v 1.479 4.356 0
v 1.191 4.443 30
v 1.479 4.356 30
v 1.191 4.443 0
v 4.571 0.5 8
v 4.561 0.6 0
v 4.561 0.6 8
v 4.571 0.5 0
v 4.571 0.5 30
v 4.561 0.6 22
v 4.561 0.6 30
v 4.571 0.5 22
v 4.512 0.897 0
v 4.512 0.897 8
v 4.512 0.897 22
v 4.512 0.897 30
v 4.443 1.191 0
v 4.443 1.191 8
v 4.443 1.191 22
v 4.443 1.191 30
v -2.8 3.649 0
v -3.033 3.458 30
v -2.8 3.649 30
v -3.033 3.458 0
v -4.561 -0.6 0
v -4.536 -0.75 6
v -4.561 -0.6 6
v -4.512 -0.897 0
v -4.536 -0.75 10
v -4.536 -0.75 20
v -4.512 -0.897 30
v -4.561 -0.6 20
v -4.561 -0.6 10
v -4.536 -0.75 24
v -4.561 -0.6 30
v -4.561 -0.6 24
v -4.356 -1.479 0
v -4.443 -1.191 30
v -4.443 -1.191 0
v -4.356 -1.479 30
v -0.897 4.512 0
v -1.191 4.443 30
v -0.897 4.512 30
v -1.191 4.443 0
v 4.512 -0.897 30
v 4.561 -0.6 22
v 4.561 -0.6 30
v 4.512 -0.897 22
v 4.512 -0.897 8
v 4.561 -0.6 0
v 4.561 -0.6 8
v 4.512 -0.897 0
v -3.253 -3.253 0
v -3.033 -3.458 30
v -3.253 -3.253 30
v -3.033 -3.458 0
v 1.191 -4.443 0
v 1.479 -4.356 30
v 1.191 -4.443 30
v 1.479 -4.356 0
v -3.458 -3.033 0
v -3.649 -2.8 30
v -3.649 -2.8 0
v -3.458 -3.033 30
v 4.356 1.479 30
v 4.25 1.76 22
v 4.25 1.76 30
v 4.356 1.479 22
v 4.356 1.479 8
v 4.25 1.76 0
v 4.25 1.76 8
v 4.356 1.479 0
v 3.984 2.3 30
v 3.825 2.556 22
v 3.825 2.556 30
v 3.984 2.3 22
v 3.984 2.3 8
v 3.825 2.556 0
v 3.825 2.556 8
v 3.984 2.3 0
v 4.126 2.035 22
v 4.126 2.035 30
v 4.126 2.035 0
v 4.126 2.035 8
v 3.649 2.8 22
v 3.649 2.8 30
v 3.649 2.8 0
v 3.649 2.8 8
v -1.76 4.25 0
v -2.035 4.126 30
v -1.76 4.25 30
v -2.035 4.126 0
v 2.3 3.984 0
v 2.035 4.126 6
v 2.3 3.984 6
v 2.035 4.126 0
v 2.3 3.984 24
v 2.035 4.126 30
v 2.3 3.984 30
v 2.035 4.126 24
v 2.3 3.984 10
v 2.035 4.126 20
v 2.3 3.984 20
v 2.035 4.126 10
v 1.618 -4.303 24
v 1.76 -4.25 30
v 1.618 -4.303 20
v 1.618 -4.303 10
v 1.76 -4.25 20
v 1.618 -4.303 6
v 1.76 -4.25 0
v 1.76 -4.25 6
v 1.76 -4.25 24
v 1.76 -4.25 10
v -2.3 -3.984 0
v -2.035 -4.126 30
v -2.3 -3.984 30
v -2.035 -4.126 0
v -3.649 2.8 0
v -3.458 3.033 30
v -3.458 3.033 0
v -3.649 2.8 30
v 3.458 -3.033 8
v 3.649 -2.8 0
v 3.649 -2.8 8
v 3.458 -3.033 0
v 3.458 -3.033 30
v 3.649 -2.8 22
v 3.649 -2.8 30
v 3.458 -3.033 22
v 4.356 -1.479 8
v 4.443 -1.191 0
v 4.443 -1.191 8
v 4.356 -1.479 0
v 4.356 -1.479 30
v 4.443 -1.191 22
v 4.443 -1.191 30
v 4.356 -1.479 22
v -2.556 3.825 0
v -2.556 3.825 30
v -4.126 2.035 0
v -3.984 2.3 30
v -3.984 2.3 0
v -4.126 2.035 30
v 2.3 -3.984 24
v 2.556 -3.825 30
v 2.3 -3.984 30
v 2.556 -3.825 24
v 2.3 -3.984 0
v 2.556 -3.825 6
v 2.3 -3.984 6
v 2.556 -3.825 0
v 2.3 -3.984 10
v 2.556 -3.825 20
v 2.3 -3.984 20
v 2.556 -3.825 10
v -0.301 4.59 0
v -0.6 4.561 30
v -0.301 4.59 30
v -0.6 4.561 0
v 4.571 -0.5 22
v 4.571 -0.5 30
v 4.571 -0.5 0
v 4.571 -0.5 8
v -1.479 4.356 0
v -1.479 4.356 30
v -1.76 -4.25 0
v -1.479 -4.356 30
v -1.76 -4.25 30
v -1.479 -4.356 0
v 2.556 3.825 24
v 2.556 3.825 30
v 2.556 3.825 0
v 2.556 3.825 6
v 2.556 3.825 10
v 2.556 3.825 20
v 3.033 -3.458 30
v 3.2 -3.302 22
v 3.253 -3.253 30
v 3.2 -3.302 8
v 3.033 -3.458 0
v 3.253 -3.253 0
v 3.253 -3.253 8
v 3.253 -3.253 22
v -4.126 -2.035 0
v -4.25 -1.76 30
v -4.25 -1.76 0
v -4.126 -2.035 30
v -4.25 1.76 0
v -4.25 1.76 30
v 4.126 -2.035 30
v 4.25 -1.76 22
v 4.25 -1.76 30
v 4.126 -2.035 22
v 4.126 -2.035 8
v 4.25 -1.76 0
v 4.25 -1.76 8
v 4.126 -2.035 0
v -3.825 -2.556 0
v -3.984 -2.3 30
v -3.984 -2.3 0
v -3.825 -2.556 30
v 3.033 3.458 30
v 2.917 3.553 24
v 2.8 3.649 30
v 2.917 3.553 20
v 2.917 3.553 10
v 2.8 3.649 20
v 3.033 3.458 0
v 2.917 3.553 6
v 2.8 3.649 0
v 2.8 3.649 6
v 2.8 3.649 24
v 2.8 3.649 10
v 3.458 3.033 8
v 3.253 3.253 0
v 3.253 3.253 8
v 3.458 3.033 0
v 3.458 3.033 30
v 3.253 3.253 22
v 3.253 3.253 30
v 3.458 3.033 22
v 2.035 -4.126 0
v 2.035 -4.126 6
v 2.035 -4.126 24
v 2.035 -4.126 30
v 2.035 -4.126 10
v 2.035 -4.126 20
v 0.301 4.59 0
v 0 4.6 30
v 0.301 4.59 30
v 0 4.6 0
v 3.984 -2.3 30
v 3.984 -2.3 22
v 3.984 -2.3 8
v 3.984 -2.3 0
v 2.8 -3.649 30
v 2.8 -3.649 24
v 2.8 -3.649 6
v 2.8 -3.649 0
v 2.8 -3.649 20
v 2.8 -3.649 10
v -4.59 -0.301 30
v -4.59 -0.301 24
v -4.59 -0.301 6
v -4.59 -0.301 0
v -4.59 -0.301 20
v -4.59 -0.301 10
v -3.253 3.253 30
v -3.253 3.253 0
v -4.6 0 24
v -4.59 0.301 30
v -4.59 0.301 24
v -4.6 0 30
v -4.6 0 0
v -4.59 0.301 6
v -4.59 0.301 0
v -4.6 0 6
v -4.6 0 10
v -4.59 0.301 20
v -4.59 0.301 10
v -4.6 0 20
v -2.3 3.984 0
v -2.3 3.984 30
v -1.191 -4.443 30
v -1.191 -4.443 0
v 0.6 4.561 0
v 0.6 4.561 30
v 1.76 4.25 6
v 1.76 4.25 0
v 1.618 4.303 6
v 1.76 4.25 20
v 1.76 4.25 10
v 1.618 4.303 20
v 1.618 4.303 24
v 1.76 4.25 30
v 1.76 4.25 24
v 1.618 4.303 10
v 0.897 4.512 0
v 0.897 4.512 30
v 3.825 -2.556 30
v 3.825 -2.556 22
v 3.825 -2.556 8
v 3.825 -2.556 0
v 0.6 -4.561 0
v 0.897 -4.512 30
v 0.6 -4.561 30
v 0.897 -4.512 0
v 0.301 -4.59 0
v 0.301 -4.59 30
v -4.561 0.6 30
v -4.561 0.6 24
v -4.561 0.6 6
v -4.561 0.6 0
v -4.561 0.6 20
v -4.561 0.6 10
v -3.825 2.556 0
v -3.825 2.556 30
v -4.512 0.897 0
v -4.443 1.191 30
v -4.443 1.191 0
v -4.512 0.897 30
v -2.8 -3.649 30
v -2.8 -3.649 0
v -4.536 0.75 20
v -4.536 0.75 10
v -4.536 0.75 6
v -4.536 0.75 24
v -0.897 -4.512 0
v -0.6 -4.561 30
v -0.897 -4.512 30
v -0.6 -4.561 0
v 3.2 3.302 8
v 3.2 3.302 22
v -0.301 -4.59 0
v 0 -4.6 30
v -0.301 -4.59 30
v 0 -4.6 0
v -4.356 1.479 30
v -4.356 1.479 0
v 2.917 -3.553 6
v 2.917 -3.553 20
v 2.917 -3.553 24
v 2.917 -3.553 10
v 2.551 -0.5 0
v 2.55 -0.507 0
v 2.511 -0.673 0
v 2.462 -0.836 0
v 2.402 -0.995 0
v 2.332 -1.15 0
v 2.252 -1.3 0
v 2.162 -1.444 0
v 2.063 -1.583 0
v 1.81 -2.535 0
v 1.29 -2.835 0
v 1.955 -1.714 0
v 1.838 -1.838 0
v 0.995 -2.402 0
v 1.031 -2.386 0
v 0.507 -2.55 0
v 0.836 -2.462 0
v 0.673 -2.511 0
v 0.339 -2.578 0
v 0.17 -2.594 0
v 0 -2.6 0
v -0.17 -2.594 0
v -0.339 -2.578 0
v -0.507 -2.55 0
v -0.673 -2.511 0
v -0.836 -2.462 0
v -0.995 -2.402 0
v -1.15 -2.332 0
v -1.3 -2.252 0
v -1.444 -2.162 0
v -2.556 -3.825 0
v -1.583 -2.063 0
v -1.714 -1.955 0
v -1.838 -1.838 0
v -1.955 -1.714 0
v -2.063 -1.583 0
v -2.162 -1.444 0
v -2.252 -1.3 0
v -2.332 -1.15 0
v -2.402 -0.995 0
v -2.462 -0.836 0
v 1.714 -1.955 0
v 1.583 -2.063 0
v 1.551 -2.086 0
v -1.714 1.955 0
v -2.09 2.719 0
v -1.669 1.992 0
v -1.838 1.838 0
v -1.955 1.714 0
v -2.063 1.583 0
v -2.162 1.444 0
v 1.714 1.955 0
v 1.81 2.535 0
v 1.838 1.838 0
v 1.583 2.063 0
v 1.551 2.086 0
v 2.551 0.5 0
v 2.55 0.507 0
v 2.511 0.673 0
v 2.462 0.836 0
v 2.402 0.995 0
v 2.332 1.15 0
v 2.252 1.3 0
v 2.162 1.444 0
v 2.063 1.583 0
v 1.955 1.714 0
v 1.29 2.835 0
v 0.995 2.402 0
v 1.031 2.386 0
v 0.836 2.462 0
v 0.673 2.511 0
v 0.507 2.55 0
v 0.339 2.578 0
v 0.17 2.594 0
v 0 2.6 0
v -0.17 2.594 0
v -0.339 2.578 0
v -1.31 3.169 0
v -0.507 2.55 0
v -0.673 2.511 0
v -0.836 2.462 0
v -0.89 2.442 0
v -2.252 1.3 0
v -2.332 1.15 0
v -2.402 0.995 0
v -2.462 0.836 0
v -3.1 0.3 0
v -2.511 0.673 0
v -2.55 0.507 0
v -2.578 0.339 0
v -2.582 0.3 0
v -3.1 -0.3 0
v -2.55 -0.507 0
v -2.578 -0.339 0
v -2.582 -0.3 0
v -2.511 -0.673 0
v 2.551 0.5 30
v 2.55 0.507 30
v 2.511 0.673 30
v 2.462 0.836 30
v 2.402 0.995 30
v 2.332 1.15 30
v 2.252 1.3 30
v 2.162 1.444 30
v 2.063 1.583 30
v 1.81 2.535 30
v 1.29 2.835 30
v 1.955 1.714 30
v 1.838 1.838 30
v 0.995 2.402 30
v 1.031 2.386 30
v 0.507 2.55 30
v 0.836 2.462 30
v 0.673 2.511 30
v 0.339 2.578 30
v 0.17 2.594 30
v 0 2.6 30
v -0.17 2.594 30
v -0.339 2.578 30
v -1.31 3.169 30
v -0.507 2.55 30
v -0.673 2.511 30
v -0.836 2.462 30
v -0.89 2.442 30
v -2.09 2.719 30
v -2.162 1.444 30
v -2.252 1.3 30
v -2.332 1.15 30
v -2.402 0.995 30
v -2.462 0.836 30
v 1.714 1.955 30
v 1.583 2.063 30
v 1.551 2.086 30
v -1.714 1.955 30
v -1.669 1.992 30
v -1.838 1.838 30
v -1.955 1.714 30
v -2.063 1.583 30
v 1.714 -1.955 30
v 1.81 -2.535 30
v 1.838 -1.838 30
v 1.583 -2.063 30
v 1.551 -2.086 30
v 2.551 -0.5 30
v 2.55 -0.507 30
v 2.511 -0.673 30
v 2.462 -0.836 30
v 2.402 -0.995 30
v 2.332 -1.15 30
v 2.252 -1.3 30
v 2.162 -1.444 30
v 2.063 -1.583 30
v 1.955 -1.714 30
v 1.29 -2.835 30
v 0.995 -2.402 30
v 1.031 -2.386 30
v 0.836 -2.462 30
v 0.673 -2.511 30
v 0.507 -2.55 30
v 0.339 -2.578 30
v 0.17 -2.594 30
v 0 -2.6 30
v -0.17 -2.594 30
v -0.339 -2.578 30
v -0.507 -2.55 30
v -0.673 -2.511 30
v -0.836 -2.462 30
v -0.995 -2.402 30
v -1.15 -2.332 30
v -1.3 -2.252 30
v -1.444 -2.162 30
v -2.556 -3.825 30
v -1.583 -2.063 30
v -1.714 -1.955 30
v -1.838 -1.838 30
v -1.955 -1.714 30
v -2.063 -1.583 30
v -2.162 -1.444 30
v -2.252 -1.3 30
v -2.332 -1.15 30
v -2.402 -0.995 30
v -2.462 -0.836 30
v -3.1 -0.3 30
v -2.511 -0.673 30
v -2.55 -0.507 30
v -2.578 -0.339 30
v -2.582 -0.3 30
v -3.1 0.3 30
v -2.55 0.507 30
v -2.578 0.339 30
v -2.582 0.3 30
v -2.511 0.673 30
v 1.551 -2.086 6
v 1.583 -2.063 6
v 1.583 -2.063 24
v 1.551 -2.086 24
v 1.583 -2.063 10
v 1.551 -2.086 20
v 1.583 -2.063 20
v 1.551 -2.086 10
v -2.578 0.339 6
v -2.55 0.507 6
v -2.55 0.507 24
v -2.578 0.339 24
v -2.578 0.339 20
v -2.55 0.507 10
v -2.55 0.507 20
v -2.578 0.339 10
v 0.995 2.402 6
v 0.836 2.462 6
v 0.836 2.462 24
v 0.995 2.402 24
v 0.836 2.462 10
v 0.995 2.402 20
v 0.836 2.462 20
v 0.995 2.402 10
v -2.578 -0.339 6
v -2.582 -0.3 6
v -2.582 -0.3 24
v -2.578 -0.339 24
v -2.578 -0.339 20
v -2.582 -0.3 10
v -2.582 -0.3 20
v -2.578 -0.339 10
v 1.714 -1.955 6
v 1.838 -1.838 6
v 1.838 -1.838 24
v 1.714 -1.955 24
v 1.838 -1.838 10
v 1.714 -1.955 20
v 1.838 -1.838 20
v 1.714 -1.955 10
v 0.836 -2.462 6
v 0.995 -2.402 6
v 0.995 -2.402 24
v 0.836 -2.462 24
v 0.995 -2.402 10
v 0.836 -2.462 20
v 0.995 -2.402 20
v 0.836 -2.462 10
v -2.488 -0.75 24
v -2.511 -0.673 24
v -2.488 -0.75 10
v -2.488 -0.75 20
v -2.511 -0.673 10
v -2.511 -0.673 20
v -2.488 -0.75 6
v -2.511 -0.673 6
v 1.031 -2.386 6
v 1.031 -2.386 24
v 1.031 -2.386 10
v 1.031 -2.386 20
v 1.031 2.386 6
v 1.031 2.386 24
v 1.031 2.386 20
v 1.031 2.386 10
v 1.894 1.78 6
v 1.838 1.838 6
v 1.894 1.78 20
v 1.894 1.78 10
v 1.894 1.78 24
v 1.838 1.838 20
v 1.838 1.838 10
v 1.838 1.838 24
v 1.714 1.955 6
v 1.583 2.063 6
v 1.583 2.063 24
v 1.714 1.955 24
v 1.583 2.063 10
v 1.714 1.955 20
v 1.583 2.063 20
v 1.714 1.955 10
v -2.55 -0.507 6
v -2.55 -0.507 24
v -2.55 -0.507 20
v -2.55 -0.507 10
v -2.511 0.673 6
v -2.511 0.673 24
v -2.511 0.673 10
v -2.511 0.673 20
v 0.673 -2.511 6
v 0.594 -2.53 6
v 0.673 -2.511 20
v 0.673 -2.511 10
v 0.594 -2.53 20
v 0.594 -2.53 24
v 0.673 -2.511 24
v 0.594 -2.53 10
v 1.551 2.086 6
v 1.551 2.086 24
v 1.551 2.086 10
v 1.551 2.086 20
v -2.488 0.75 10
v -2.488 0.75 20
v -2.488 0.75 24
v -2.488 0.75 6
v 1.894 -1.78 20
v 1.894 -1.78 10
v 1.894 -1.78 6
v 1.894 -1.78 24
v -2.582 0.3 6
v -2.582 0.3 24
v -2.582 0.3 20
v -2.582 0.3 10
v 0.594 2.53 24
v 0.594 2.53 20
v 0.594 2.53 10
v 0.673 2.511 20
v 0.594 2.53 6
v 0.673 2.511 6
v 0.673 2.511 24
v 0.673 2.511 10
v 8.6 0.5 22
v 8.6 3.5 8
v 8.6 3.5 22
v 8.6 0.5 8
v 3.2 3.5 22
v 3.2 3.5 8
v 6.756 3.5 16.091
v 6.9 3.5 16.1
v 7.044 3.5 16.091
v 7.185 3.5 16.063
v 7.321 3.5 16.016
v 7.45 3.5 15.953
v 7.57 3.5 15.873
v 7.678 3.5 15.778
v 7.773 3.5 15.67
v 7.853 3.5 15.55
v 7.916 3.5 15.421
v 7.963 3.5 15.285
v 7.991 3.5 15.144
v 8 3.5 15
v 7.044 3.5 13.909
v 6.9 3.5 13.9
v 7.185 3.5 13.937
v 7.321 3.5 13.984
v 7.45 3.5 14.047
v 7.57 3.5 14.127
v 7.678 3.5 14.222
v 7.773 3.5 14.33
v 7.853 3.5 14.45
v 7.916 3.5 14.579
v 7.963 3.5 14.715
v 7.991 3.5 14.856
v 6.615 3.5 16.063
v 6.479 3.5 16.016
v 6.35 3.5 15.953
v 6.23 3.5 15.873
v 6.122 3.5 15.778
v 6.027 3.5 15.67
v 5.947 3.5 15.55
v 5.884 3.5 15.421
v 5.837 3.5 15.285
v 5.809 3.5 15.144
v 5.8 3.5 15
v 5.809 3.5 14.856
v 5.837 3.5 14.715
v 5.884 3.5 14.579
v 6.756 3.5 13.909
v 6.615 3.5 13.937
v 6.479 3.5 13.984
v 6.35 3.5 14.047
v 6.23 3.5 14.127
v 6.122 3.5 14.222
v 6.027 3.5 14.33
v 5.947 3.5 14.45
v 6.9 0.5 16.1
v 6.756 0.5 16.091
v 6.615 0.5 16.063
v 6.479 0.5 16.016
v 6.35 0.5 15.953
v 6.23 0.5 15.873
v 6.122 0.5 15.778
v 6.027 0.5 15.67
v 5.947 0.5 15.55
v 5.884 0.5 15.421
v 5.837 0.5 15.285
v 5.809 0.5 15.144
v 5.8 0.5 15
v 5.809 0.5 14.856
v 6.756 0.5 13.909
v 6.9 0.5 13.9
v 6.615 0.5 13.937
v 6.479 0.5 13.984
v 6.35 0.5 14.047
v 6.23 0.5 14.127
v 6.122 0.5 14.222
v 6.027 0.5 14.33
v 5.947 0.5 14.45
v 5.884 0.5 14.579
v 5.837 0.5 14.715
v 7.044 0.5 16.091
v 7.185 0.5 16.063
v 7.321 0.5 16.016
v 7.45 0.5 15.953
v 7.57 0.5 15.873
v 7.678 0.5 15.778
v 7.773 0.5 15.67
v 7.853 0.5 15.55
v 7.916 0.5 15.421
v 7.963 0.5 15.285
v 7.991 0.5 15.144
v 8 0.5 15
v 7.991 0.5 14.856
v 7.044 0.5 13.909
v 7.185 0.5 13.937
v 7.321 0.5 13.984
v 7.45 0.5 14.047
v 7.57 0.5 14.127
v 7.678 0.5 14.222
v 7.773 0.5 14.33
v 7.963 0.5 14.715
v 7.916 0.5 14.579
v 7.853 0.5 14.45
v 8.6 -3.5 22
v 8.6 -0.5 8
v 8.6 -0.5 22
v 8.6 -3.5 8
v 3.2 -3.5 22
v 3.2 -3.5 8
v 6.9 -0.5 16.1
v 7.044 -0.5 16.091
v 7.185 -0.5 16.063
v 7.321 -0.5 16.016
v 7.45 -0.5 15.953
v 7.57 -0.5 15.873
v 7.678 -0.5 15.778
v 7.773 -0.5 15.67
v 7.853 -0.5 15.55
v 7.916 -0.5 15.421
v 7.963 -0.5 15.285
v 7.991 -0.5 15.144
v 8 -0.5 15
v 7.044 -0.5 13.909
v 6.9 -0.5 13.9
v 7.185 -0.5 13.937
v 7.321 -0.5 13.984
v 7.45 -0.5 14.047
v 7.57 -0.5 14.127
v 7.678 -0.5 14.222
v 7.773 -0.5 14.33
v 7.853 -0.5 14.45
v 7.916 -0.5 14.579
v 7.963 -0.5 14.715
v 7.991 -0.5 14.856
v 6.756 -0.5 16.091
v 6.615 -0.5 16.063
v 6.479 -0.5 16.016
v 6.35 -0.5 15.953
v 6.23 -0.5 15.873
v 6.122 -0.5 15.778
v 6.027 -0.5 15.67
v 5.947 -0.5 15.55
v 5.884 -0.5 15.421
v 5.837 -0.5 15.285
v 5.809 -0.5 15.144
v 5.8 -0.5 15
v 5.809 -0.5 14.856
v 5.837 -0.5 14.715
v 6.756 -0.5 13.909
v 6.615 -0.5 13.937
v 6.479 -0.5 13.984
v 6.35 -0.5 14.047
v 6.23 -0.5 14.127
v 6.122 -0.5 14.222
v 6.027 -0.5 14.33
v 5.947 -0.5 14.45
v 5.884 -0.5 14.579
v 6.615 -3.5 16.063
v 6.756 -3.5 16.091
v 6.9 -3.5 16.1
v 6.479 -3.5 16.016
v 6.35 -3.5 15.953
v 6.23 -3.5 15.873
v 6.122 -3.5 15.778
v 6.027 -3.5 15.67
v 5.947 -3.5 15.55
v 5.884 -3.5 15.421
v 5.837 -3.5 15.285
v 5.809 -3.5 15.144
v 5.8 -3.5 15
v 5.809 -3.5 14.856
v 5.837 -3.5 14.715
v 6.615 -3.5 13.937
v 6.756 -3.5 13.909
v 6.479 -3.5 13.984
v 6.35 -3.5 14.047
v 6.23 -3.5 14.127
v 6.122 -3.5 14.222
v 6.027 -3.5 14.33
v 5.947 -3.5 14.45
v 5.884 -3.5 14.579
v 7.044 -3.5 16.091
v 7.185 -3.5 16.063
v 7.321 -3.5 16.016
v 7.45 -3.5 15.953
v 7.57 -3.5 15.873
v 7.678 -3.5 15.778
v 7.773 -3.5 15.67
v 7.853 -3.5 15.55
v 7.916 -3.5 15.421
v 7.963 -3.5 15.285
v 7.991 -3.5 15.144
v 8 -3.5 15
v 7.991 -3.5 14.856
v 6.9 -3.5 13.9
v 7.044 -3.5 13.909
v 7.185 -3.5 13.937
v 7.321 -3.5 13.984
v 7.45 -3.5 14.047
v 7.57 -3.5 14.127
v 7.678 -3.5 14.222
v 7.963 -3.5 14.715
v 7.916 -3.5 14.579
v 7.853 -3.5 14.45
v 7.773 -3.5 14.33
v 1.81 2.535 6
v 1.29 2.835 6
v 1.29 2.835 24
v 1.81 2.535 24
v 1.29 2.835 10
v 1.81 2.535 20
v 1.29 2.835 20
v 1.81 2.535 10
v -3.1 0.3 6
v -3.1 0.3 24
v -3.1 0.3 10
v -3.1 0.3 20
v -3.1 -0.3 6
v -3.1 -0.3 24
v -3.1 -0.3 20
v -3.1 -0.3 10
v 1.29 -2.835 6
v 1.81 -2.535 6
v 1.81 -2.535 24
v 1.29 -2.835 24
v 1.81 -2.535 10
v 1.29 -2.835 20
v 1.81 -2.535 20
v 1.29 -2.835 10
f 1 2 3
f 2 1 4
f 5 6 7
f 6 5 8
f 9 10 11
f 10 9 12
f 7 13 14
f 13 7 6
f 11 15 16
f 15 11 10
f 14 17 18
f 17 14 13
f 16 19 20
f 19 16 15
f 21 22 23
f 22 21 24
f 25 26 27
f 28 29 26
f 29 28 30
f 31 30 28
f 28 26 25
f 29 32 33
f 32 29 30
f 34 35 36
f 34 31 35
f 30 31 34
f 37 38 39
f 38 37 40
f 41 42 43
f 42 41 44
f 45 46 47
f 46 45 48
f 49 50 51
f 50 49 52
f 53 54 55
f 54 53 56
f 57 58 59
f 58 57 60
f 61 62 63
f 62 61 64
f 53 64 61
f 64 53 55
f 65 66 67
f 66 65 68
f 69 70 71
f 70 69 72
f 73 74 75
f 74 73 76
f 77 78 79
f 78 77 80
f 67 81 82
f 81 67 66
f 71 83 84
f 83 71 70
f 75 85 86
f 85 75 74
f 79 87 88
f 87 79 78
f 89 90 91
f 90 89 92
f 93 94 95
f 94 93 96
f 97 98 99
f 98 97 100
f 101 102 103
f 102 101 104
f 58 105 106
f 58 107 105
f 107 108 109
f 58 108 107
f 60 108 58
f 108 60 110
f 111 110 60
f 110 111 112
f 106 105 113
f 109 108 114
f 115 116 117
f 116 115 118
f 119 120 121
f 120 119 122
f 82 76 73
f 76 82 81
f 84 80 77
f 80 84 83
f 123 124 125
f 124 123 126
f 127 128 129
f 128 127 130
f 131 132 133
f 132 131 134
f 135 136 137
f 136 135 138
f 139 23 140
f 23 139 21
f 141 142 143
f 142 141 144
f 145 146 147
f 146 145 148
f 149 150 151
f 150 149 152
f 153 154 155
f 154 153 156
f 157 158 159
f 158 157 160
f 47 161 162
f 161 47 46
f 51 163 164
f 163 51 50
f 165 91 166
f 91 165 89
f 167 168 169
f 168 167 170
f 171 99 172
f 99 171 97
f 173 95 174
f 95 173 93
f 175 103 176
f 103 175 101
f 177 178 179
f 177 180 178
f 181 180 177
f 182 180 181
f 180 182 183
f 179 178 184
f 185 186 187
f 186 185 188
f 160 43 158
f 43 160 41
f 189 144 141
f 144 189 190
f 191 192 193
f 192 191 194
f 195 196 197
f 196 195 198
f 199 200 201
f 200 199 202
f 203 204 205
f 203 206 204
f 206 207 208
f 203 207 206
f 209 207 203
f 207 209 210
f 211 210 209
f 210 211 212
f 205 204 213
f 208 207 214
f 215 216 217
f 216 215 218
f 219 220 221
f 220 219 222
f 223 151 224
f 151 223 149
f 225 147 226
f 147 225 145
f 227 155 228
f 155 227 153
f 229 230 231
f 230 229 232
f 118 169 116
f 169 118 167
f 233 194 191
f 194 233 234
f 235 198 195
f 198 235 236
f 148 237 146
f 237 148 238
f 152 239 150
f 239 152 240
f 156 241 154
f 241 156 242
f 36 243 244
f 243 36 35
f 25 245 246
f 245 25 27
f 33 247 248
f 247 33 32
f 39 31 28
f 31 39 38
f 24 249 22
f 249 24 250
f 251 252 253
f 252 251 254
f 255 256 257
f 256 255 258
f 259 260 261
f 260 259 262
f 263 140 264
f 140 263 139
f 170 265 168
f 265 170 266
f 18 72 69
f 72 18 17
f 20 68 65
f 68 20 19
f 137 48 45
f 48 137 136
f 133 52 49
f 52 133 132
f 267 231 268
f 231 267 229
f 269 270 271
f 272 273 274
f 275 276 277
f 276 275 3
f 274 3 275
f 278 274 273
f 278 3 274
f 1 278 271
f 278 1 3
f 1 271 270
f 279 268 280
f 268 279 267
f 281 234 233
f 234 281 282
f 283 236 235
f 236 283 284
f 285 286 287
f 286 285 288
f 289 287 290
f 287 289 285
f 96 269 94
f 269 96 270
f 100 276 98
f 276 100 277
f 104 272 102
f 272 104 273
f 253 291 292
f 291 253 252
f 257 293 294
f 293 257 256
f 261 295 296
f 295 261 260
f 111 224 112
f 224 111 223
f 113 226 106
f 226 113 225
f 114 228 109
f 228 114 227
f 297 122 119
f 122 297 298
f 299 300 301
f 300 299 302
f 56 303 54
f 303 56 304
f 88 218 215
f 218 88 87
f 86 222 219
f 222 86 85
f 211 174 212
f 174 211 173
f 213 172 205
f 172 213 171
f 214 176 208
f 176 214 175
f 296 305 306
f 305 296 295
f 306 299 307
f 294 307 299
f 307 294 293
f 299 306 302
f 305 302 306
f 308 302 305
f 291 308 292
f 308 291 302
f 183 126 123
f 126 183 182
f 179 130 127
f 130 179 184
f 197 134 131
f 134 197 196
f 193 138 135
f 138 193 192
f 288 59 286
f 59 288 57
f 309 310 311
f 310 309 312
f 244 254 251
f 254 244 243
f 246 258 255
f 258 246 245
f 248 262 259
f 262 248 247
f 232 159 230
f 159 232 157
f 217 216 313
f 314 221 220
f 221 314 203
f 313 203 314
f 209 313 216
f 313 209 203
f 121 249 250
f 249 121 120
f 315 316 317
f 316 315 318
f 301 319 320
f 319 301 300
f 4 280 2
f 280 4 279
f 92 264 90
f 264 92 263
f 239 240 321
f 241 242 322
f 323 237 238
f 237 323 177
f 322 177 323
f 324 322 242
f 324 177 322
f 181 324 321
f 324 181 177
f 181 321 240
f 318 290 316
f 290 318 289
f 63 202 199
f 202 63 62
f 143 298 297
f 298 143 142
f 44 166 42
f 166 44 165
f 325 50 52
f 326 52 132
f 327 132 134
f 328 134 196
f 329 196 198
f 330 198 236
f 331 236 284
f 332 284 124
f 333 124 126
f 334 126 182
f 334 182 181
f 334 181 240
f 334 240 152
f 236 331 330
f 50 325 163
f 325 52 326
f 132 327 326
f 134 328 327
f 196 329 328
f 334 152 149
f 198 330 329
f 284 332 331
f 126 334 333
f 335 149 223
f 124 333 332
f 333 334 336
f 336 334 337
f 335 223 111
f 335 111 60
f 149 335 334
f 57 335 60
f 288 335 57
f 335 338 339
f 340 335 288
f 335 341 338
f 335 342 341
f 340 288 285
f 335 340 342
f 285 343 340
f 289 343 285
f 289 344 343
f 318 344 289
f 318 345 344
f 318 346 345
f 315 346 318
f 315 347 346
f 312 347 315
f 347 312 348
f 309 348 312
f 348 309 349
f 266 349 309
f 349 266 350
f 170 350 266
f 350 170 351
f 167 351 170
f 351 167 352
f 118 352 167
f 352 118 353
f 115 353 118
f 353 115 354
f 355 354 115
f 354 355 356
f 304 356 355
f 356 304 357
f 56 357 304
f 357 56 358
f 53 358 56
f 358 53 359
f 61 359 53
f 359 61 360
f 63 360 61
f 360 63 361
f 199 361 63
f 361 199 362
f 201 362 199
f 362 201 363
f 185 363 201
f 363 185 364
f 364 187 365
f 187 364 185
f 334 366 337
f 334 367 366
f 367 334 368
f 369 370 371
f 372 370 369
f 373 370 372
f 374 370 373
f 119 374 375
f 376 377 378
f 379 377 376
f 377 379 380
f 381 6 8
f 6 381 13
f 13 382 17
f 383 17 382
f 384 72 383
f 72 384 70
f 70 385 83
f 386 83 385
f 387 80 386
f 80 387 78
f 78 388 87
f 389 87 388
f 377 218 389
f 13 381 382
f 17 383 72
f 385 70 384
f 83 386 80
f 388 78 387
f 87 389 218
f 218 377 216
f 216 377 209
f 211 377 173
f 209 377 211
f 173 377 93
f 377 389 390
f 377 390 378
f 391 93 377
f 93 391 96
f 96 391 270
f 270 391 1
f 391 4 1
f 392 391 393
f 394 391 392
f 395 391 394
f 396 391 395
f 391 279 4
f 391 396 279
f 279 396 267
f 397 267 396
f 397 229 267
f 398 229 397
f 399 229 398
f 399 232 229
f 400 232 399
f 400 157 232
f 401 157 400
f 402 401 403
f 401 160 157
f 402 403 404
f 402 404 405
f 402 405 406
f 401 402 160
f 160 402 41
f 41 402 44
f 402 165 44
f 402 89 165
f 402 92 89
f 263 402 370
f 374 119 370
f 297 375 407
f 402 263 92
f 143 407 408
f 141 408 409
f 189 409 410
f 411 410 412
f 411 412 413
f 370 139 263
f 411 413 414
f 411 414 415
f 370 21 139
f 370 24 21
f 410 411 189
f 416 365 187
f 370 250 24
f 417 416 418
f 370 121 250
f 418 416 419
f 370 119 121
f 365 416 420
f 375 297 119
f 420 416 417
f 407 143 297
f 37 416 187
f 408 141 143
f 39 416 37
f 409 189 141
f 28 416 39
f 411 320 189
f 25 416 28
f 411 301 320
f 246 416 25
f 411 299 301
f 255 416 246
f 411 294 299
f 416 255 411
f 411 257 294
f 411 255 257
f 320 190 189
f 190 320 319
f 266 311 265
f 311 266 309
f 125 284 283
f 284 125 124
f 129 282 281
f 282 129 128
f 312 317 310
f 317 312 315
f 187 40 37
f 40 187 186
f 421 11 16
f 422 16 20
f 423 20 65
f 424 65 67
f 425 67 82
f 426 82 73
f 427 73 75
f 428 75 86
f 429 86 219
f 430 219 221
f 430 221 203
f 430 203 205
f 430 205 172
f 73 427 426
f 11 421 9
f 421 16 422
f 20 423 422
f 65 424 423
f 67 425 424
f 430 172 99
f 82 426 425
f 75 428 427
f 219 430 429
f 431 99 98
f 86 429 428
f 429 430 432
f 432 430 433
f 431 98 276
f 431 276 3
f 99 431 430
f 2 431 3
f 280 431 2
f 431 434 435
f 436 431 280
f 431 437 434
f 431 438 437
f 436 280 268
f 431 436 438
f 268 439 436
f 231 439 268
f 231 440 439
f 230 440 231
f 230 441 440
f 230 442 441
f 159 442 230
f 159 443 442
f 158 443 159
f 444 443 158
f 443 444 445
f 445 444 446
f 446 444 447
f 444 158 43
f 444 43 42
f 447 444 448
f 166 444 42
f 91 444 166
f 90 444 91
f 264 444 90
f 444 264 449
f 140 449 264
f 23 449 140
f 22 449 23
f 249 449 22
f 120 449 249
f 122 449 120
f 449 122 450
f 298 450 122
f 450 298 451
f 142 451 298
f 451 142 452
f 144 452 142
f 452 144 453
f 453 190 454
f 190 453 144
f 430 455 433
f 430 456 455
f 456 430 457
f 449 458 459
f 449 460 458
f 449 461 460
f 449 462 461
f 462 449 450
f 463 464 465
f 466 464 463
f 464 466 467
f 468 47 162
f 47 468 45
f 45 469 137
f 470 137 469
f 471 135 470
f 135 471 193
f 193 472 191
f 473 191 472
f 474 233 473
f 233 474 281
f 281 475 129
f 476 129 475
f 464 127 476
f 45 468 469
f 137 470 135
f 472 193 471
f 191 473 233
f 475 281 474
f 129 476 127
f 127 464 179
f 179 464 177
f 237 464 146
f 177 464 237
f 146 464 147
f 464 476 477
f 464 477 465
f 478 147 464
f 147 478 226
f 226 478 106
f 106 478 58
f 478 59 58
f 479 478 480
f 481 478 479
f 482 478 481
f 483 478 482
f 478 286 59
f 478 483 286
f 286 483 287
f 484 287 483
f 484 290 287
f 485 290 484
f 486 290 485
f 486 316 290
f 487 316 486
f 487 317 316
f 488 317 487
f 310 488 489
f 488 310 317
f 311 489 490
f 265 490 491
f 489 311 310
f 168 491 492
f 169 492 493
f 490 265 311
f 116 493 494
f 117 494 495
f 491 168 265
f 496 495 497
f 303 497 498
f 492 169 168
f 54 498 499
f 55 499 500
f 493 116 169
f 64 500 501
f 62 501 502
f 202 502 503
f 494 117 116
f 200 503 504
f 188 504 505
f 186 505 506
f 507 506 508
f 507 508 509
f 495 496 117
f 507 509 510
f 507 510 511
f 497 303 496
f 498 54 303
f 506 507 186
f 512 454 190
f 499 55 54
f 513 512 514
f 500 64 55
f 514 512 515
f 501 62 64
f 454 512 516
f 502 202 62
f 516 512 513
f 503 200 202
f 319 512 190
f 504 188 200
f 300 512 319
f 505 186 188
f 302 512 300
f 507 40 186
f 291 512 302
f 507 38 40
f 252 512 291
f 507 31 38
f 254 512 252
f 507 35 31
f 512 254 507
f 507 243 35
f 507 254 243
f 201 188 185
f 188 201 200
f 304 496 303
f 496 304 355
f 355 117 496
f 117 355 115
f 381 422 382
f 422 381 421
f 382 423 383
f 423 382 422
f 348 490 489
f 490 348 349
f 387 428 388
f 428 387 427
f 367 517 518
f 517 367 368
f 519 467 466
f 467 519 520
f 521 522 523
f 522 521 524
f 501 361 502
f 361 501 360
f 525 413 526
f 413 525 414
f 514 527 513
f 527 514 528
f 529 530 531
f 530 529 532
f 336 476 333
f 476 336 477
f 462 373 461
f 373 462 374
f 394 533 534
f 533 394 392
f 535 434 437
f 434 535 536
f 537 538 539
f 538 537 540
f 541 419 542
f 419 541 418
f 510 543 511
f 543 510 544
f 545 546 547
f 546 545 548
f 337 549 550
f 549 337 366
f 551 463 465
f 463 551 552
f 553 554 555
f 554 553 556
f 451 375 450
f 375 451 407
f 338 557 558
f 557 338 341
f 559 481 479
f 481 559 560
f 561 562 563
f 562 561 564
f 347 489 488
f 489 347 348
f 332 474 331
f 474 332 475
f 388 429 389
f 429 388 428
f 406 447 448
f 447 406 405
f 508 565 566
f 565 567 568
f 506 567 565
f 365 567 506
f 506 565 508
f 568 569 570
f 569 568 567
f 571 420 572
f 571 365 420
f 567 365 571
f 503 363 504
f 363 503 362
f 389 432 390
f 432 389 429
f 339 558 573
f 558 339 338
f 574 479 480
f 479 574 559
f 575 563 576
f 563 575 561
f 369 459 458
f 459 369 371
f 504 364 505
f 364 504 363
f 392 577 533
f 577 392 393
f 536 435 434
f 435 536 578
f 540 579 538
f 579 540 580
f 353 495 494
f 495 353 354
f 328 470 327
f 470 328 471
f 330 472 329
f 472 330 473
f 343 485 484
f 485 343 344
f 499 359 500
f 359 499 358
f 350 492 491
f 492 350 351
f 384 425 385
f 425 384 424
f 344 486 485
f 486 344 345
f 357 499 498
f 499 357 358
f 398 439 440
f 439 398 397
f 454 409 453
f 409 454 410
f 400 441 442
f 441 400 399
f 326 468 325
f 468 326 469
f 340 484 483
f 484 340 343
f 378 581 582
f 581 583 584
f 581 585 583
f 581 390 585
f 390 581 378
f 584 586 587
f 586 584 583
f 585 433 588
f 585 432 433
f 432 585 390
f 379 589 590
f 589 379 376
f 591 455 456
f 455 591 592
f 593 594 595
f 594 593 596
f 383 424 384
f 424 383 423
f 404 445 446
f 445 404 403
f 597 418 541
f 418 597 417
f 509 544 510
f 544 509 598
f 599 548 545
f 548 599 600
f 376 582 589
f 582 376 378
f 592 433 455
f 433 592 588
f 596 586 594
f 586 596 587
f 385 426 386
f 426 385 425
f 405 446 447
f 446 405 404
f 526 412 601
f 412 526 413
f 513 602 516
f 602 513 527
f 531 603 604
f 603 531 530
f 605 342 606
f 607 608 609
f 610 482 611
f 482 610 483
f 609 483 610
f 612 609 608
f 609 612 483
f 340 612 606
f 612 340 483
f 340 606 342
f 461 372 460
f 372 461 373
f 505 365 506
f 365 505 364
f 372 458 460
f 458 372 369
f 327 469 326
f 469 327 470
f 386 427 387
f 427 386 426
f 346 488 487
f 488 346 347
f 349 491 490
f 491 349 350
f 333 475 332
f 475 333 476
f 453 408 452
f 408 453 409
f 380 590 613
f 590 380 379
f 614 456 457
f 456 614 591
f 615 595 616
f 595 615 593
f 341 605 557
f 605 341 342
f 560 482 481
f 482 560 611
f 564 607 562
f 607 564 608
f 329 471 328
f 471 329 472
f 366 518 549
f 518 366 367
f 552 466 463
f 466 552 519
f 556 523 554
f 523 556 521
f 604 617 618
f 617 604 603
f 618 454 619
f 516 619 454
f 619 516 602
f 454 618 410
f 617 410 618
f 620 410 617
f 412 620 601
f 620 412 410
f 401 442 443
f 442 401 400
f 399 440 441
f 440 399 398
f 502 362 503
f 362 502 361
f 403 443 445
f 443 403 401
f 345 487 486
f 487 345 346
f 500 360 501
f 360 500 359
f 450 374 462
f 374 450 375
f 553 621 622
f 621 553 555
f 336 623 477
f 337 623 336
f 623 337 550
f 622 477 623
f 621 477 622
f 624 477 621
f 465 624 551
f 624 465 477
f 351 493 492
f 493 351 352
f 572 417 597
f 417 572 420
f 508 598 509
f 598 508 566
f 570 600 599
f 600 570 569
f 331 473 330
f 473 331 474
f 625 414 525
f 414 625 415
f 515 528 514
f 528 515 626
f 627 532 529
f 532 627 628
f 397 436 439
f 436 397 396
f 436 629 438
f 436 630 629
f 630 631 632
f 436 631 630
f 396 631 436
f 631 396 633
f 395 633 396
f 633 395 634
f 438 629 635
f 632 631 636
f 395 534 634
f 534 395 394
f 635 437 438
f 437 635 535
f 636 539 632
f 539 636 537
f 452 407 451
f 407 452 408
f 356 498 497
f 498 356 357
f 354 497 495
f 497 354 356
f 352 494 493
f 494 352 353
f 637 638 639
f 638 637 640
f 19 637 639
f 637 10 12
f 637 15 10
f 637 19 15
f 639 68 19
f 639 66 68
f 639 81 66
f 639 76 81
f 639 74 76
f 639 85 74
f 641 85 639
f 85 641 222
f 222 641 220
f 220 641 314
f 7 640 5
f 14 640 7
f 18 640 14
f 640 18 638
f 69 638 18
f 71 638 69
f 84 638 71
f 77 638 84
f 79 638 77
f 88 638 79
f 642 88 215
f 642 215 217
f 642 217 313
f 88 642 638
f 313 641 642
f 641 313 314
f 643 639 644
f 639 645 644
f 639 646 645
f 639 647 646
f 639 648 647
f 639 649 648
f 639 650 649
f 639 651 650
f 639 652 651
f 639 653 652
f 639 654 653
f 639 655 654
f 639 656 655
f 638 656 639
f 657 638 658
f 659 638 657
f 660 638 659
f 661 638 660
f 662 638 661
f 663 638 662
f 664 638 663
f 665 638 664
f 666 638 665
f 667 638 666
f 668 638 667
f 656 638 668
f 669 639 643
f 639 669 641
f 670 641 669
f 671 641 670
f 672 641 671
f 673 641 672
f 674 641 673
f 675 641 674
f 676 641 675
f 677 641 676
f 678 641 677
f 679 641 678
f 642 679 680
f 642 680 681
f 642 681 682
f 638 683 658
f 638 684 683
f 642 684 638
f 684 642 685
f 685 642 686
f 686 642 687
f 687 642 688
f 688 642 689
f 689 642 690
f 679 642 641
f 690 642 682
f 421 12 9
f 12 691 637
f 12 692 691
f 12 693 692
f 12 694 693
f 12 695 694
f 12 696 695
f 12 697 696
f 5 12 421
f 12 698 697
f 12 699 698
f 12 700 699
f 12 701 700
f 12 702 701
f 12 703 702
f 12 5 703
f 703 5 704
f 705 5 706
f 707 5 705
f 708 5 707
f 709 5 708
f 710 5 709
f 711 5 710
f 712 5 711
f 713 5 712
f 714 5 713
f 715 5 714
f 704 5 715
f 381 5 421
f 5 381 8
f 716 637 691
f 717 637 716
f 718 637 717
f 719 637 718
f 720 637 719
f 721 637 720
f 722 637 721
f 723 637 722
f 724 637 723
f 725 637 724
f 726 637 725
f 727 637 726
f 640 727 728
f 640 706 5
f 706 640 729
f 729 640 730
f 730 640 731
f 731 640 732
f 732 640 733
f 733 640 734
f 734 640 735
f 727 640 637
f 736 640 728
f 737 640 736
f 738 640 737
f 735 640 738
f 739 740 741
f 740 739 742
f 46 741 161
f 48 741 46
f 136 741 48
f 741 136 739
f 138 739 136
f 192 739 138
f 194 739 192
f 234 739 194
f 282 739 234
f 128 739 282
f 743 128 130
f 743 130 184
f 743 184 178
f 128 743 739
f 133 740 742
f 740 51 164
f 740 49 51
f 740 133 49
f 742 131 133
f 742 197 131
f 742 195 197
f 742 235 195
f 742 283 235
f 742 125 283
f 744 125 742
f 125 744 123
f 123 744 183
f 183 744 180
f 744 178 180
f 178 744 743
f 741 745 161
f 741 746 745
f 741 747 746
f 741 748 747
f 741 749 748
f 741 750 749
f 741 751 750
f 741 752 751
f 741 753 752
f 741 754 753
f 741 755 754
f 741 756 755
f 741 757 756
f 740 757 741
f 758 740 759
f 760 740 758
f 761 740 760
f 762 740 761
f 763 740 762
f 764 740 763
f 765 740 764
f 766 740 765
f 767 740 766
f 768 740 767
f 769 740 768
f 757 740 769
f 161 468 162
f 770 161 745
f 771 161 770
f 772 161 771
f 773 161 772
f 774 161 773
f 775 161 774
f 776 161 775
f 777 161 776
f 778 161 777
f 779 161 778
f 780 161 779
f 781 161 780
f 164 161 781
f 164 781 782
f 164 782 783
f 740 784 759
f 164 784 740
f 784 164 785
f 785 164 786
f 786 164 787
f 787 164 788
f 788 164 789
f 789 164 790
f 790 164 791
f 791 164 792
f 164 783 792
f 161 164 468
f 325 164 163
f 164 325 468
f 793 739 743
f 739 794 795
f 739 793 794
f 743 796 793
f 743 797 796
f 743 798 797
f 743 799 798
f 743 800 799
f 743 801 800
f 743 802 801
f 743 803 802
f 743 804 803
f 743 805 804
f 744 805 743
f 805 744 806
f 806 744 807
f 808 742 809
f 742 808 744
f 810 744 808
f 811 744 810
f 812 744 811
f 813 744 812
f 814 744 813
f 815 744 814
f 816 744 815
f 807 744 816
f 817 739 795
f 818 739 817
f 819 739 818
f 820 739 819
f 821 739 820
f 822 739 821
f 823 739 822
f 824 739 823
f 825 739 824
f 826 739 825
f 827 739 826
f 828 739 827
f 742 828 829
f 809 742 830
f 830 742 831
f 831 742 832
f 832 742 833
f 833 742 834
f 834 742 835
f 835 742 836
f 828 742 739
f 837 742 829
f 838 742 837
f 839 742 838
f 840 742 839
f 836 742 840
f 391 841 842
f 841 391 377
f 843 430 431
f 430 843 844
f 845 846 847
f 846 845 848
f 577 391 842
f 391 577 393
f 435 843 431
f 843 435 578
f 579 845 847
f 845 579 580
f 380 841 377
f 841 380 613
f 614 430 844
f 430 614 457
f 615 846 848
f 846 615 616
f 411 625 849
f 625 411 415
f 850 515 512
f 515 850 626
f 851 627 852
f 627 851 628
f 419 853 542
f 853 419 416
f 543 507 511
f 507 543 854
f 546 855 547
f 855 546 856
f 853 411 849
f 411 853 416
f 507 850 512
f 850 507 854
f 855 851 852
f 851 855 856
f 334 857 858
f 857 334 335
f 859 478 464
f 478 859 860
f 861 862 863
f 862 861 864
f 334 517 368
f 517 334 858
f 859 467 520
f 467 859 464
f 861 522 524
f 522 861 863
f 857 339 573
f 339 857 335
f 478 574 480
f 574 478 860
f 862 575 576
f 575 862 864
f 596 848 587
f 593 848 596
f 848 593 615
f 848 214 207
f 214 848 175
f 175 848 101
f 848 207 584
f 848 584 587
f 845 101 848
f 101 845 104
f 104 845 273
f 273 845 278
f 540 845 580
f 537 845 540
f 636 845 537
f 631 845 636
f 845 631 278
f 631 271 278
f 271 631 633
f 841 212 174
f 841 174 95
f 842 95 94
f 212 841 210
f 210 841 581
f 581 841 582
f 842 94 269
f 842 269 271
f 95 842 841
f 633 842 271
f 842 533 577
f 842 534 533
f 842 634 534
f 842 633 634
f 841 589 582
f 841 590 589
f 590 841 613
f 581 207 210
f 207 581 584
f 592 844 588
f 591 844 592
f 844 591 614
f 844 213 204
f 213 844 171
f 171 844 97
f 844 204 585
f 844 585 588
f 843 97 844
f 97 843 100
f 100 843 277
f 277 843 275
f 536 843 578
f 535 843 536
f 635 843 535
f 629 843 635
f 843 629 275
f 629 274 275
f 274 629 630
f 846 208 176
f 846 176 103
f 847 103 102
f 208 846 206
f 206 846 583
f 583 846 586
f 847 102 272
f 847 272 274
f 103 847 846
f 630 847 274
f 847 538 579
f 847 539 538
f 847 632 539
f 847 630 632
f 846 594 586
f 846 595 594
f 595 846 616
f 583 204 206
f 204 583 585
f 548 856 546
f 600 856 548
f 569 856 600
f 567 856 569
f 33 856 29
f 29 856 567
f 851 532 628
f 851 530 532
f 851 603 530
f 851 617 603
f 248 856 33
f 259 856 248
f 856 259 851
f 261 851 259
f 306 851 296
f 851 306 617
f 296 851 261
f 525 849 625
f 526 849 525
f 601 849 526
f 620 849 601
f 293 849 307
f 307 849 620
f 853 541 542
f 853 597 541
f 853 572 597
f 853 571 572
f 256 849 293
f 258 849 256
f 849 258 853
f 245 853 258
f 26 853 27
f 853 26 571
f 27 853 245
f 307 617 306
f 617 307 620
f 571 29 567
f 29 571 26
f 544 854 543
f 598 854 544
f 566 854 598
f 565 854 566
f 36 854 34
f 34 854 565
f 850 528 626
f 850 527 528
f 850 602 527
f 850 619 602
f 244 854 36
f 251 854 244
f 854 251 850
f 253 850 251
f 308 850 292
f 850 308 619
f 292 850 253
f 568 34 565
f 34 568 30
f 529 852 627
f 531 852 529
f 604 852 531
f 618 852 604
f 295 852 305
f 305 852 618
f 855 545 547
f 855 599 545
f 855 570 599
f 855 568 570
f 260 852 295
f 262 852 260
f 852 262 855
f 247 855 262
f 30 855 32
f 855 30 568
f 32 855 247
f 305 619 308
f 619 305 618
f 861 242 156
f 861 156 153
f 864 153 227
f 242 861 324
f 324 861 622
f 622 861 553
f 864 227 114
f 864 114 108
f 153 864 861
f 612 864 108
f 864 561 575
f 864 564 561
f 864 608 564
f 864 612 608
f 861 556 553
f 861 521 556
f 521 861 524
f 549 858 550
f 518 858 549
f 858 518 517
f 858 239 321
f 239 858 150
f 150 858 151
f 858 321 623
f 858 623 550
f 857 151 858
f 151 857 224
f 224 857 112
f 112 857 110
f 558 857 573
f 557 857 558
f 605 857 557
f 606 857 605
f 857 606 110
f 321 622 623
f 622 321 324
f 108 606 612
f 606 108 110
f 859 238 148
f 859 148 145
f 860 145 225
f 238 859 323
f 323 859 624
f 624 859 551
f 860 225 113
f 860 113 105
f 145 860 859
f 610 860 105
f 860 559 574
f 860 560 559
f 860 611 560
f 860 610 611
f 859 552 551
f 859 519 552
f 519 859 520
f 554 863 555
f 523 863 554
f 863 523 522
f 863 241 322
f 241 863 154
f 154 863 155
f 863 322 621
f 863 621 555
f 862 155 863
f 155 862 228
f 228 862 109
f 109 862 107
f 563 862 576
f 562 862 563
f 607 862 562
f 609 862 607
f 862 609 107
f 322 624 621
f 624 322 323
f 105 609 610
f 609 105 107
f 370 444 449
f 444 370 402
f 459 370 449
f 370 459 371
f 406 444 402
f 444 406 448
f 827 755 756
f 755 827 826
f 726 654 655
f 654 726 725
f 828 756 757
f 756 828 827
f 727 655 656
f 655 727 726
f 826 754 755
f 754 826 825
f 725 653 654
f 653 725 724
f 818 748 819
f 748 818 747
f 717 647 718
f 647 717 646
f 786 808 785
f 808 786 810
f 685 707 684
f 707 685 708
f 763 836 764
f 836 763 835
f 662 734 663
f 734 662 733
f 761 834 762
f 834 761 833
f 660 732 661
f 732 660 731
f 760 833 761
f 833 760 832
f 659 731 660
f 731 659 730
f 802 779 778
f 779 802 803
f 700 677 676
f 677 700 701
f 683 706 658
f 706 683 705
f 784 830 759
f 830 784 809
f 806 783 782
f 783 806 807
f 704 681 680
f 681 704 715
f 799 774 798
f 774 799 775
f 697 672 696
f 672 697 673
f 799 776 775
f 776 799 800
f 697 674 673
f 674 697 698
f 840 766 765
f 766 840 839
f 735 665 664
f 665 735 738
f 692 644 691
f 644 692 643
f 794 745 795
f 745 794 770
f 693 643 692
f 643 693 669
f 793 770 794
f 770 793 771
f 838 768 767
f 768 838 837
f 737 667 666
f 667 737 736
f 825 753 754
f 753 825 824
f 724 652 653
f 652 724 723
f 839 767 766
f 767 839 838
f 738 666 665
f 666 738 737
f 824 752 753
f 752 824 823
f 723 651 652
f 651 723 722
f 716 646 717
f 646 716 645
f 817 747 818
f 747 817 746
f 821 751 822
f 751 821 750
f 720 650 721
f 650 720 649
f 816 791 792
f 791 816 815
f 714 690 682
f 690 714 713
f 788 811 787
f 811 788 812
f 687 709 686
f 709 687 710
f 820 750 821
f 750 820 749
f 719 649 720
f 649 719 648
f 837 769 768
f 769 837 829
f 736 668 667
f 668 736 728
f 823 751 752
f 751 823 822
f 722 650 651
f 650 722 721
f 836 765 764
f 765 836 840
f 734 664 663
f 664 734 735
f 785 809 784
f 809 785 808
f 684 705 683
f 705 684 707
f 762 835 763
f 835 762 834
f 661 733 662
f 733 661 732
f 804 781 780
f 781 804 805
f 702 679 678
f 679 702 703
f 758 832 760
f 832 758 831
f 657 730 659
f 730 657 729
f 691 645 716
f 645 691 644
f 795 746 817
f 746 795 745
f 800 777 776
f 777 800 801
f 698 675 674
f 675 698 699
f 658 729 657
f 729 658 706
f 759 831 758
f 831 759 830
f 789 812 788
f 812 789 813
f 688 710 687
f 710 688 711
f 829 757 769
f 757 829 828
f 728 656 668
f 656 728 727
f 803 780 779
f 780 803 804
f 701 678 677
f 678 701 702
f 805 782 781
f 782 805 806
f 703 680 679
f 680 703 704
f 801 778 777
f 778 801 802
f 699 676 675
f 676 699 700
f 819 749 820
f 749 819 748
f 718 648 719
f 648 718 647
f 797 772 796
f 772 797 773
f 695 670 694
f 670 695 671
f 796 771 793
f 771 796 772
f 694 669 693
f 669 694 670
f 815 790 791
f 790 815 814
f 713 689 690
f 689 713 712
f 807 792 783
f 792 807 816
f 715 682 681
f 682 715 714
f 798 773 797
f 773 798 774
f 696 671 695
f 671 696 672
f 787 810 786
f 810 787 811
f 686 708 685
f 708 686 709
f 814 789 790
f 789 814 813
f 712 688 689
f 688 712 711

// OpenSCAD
// Parametric clip-on sleeve holder for the FBG force sensor. CONCEPT ONLY.
// This file describes the same geometry as hardware/generate_sleeve.py.
// The Python version was built and checked (watertight, one body, no overlap with the fibers).
// THIS OPENSCAD FILE WAS NOT RENDERED: OpenSCAD was not available. Check the render before use.
// No strain flexure is modelled. Every dimension is a default to confirm.
// Hardware licence: CERN Open Hardware Licence (variant and header to be added by the author).

shaft_d      = 5.0;   // mm, instrument shaft diameter [TO CONFIRM]; 5 and 10 mm are the common manual sizes
clearance    = 0.2;   // mm, diametral clearance shaft / sleeve
wall         = 2.0;   // mm
length       = 30;    // mm
slit_w       = 1.0;   // mm, clip slit (along +x)
fiber_d      = 0.25;  // mm, coated fiber [TO CONFIRM]; used only for documentation here
groove_w     = 0.6;   // mm, open groove for each strained fiber
groove_d     = 0.5;   // mm, groove depth from the bore
ref_groove_w = 0.9;   // mm, open groove for the reference fiber in its loose capillary
ref_groove_d = 0.8;   // mm, depth of that groove from the bore
capillary_d  = 0.6;   // mm, loose polyimide capillary around the reference fiber [TO CONFIRM]
window_len   = 4;     // mm, adhesive access window length along the shaft
window_w     = 1.5;   // mm, adhesive access window width
window_dz    = 7;     // mm, windows centred at length/2 +/- window_dz
tab_len      = 4;     // mm, tab protrusion beyond the outer surface
tab_t        = 3;     // mm, tab thickness on each side of the slit
tab_z        = 14;    // mm, tab length along the shaft
screw_hole_d = 2.2;   // mm, M2 clearance hole

strained_deg = [60, 180, 300];  // degrees from the slit direction, 120 degrees apart
ref_deg      = 120;             // degrees from the slit direction

$fn = 96;

R_in  = (shaft_d + clearance) / 2;
R_out = R_in + wall;

difference() {
    union() {
        difference() {
            cylinder(r = R_out, h = length);
            translate([0, 0, -1]) cylinder(r = R_in, h = length + 2);
        }
        // clamp tabs on both sides of the slit
        translate([R_in + 0.6,  slit_w / 2,           length / 2 - tab_z / 2])
            cube([R_out + tab_len - (R_in + 0.6), tab_t, tab_z]);
        translate([R_in + 0.6, -slit_w / 2 - tab_t,   length / 2 - tab_z / 2])
            cube([R_out + tab_len - (R_in + 0.6), tab_t, tab_z]);
    }

    // slit
    translate([0, -slit_w / 2, -1]) cube([R_out + tab_len + 2, slit_w, length + 2]);

    // open grooves for the strained fibers (bonded to the shaft)
    for (a = strained_deg)
        rotate([0, 0, a])
            translate([R_in - 0.2, -groove_w / 2, -1])
                cube([groove_d + 0.2, groove_w, length + 2]);

    // open groove for the reference fiber (loose capillary on the shaft, thermal grease, strain-free)
    rotate([0, 0, ref_deg])
        translate([R_in - 0.2, -ref_groove_w / 2, -1])
            cube([ref_groove_d + 0.2, ref_groove_w, length + 2]);

    // adhesive access windows: radial slots through the wall above each strained groove
    for (a = strained_deg)
        for (dz = [-window_dz, window_dz])
            rotate([0, 0, a])
                translate([R_in - 0.2, -window_w / 2, length / 2 + dz - window_len / 2])
                    cube([R_out + 0.5 - (R_in - 0.2), window_w, window_len]);

    // M2 clamp hole through both tabs, along y
    translate([R_out + tab_len / 2 + 0.3, 0, length / 2])
        rotate([90, 0, 0])
            cylinder(d = screw_hole_d, h = 2 * (slit_w / 2 + tab_t) + 2, center = true, $fn = 48);
}
